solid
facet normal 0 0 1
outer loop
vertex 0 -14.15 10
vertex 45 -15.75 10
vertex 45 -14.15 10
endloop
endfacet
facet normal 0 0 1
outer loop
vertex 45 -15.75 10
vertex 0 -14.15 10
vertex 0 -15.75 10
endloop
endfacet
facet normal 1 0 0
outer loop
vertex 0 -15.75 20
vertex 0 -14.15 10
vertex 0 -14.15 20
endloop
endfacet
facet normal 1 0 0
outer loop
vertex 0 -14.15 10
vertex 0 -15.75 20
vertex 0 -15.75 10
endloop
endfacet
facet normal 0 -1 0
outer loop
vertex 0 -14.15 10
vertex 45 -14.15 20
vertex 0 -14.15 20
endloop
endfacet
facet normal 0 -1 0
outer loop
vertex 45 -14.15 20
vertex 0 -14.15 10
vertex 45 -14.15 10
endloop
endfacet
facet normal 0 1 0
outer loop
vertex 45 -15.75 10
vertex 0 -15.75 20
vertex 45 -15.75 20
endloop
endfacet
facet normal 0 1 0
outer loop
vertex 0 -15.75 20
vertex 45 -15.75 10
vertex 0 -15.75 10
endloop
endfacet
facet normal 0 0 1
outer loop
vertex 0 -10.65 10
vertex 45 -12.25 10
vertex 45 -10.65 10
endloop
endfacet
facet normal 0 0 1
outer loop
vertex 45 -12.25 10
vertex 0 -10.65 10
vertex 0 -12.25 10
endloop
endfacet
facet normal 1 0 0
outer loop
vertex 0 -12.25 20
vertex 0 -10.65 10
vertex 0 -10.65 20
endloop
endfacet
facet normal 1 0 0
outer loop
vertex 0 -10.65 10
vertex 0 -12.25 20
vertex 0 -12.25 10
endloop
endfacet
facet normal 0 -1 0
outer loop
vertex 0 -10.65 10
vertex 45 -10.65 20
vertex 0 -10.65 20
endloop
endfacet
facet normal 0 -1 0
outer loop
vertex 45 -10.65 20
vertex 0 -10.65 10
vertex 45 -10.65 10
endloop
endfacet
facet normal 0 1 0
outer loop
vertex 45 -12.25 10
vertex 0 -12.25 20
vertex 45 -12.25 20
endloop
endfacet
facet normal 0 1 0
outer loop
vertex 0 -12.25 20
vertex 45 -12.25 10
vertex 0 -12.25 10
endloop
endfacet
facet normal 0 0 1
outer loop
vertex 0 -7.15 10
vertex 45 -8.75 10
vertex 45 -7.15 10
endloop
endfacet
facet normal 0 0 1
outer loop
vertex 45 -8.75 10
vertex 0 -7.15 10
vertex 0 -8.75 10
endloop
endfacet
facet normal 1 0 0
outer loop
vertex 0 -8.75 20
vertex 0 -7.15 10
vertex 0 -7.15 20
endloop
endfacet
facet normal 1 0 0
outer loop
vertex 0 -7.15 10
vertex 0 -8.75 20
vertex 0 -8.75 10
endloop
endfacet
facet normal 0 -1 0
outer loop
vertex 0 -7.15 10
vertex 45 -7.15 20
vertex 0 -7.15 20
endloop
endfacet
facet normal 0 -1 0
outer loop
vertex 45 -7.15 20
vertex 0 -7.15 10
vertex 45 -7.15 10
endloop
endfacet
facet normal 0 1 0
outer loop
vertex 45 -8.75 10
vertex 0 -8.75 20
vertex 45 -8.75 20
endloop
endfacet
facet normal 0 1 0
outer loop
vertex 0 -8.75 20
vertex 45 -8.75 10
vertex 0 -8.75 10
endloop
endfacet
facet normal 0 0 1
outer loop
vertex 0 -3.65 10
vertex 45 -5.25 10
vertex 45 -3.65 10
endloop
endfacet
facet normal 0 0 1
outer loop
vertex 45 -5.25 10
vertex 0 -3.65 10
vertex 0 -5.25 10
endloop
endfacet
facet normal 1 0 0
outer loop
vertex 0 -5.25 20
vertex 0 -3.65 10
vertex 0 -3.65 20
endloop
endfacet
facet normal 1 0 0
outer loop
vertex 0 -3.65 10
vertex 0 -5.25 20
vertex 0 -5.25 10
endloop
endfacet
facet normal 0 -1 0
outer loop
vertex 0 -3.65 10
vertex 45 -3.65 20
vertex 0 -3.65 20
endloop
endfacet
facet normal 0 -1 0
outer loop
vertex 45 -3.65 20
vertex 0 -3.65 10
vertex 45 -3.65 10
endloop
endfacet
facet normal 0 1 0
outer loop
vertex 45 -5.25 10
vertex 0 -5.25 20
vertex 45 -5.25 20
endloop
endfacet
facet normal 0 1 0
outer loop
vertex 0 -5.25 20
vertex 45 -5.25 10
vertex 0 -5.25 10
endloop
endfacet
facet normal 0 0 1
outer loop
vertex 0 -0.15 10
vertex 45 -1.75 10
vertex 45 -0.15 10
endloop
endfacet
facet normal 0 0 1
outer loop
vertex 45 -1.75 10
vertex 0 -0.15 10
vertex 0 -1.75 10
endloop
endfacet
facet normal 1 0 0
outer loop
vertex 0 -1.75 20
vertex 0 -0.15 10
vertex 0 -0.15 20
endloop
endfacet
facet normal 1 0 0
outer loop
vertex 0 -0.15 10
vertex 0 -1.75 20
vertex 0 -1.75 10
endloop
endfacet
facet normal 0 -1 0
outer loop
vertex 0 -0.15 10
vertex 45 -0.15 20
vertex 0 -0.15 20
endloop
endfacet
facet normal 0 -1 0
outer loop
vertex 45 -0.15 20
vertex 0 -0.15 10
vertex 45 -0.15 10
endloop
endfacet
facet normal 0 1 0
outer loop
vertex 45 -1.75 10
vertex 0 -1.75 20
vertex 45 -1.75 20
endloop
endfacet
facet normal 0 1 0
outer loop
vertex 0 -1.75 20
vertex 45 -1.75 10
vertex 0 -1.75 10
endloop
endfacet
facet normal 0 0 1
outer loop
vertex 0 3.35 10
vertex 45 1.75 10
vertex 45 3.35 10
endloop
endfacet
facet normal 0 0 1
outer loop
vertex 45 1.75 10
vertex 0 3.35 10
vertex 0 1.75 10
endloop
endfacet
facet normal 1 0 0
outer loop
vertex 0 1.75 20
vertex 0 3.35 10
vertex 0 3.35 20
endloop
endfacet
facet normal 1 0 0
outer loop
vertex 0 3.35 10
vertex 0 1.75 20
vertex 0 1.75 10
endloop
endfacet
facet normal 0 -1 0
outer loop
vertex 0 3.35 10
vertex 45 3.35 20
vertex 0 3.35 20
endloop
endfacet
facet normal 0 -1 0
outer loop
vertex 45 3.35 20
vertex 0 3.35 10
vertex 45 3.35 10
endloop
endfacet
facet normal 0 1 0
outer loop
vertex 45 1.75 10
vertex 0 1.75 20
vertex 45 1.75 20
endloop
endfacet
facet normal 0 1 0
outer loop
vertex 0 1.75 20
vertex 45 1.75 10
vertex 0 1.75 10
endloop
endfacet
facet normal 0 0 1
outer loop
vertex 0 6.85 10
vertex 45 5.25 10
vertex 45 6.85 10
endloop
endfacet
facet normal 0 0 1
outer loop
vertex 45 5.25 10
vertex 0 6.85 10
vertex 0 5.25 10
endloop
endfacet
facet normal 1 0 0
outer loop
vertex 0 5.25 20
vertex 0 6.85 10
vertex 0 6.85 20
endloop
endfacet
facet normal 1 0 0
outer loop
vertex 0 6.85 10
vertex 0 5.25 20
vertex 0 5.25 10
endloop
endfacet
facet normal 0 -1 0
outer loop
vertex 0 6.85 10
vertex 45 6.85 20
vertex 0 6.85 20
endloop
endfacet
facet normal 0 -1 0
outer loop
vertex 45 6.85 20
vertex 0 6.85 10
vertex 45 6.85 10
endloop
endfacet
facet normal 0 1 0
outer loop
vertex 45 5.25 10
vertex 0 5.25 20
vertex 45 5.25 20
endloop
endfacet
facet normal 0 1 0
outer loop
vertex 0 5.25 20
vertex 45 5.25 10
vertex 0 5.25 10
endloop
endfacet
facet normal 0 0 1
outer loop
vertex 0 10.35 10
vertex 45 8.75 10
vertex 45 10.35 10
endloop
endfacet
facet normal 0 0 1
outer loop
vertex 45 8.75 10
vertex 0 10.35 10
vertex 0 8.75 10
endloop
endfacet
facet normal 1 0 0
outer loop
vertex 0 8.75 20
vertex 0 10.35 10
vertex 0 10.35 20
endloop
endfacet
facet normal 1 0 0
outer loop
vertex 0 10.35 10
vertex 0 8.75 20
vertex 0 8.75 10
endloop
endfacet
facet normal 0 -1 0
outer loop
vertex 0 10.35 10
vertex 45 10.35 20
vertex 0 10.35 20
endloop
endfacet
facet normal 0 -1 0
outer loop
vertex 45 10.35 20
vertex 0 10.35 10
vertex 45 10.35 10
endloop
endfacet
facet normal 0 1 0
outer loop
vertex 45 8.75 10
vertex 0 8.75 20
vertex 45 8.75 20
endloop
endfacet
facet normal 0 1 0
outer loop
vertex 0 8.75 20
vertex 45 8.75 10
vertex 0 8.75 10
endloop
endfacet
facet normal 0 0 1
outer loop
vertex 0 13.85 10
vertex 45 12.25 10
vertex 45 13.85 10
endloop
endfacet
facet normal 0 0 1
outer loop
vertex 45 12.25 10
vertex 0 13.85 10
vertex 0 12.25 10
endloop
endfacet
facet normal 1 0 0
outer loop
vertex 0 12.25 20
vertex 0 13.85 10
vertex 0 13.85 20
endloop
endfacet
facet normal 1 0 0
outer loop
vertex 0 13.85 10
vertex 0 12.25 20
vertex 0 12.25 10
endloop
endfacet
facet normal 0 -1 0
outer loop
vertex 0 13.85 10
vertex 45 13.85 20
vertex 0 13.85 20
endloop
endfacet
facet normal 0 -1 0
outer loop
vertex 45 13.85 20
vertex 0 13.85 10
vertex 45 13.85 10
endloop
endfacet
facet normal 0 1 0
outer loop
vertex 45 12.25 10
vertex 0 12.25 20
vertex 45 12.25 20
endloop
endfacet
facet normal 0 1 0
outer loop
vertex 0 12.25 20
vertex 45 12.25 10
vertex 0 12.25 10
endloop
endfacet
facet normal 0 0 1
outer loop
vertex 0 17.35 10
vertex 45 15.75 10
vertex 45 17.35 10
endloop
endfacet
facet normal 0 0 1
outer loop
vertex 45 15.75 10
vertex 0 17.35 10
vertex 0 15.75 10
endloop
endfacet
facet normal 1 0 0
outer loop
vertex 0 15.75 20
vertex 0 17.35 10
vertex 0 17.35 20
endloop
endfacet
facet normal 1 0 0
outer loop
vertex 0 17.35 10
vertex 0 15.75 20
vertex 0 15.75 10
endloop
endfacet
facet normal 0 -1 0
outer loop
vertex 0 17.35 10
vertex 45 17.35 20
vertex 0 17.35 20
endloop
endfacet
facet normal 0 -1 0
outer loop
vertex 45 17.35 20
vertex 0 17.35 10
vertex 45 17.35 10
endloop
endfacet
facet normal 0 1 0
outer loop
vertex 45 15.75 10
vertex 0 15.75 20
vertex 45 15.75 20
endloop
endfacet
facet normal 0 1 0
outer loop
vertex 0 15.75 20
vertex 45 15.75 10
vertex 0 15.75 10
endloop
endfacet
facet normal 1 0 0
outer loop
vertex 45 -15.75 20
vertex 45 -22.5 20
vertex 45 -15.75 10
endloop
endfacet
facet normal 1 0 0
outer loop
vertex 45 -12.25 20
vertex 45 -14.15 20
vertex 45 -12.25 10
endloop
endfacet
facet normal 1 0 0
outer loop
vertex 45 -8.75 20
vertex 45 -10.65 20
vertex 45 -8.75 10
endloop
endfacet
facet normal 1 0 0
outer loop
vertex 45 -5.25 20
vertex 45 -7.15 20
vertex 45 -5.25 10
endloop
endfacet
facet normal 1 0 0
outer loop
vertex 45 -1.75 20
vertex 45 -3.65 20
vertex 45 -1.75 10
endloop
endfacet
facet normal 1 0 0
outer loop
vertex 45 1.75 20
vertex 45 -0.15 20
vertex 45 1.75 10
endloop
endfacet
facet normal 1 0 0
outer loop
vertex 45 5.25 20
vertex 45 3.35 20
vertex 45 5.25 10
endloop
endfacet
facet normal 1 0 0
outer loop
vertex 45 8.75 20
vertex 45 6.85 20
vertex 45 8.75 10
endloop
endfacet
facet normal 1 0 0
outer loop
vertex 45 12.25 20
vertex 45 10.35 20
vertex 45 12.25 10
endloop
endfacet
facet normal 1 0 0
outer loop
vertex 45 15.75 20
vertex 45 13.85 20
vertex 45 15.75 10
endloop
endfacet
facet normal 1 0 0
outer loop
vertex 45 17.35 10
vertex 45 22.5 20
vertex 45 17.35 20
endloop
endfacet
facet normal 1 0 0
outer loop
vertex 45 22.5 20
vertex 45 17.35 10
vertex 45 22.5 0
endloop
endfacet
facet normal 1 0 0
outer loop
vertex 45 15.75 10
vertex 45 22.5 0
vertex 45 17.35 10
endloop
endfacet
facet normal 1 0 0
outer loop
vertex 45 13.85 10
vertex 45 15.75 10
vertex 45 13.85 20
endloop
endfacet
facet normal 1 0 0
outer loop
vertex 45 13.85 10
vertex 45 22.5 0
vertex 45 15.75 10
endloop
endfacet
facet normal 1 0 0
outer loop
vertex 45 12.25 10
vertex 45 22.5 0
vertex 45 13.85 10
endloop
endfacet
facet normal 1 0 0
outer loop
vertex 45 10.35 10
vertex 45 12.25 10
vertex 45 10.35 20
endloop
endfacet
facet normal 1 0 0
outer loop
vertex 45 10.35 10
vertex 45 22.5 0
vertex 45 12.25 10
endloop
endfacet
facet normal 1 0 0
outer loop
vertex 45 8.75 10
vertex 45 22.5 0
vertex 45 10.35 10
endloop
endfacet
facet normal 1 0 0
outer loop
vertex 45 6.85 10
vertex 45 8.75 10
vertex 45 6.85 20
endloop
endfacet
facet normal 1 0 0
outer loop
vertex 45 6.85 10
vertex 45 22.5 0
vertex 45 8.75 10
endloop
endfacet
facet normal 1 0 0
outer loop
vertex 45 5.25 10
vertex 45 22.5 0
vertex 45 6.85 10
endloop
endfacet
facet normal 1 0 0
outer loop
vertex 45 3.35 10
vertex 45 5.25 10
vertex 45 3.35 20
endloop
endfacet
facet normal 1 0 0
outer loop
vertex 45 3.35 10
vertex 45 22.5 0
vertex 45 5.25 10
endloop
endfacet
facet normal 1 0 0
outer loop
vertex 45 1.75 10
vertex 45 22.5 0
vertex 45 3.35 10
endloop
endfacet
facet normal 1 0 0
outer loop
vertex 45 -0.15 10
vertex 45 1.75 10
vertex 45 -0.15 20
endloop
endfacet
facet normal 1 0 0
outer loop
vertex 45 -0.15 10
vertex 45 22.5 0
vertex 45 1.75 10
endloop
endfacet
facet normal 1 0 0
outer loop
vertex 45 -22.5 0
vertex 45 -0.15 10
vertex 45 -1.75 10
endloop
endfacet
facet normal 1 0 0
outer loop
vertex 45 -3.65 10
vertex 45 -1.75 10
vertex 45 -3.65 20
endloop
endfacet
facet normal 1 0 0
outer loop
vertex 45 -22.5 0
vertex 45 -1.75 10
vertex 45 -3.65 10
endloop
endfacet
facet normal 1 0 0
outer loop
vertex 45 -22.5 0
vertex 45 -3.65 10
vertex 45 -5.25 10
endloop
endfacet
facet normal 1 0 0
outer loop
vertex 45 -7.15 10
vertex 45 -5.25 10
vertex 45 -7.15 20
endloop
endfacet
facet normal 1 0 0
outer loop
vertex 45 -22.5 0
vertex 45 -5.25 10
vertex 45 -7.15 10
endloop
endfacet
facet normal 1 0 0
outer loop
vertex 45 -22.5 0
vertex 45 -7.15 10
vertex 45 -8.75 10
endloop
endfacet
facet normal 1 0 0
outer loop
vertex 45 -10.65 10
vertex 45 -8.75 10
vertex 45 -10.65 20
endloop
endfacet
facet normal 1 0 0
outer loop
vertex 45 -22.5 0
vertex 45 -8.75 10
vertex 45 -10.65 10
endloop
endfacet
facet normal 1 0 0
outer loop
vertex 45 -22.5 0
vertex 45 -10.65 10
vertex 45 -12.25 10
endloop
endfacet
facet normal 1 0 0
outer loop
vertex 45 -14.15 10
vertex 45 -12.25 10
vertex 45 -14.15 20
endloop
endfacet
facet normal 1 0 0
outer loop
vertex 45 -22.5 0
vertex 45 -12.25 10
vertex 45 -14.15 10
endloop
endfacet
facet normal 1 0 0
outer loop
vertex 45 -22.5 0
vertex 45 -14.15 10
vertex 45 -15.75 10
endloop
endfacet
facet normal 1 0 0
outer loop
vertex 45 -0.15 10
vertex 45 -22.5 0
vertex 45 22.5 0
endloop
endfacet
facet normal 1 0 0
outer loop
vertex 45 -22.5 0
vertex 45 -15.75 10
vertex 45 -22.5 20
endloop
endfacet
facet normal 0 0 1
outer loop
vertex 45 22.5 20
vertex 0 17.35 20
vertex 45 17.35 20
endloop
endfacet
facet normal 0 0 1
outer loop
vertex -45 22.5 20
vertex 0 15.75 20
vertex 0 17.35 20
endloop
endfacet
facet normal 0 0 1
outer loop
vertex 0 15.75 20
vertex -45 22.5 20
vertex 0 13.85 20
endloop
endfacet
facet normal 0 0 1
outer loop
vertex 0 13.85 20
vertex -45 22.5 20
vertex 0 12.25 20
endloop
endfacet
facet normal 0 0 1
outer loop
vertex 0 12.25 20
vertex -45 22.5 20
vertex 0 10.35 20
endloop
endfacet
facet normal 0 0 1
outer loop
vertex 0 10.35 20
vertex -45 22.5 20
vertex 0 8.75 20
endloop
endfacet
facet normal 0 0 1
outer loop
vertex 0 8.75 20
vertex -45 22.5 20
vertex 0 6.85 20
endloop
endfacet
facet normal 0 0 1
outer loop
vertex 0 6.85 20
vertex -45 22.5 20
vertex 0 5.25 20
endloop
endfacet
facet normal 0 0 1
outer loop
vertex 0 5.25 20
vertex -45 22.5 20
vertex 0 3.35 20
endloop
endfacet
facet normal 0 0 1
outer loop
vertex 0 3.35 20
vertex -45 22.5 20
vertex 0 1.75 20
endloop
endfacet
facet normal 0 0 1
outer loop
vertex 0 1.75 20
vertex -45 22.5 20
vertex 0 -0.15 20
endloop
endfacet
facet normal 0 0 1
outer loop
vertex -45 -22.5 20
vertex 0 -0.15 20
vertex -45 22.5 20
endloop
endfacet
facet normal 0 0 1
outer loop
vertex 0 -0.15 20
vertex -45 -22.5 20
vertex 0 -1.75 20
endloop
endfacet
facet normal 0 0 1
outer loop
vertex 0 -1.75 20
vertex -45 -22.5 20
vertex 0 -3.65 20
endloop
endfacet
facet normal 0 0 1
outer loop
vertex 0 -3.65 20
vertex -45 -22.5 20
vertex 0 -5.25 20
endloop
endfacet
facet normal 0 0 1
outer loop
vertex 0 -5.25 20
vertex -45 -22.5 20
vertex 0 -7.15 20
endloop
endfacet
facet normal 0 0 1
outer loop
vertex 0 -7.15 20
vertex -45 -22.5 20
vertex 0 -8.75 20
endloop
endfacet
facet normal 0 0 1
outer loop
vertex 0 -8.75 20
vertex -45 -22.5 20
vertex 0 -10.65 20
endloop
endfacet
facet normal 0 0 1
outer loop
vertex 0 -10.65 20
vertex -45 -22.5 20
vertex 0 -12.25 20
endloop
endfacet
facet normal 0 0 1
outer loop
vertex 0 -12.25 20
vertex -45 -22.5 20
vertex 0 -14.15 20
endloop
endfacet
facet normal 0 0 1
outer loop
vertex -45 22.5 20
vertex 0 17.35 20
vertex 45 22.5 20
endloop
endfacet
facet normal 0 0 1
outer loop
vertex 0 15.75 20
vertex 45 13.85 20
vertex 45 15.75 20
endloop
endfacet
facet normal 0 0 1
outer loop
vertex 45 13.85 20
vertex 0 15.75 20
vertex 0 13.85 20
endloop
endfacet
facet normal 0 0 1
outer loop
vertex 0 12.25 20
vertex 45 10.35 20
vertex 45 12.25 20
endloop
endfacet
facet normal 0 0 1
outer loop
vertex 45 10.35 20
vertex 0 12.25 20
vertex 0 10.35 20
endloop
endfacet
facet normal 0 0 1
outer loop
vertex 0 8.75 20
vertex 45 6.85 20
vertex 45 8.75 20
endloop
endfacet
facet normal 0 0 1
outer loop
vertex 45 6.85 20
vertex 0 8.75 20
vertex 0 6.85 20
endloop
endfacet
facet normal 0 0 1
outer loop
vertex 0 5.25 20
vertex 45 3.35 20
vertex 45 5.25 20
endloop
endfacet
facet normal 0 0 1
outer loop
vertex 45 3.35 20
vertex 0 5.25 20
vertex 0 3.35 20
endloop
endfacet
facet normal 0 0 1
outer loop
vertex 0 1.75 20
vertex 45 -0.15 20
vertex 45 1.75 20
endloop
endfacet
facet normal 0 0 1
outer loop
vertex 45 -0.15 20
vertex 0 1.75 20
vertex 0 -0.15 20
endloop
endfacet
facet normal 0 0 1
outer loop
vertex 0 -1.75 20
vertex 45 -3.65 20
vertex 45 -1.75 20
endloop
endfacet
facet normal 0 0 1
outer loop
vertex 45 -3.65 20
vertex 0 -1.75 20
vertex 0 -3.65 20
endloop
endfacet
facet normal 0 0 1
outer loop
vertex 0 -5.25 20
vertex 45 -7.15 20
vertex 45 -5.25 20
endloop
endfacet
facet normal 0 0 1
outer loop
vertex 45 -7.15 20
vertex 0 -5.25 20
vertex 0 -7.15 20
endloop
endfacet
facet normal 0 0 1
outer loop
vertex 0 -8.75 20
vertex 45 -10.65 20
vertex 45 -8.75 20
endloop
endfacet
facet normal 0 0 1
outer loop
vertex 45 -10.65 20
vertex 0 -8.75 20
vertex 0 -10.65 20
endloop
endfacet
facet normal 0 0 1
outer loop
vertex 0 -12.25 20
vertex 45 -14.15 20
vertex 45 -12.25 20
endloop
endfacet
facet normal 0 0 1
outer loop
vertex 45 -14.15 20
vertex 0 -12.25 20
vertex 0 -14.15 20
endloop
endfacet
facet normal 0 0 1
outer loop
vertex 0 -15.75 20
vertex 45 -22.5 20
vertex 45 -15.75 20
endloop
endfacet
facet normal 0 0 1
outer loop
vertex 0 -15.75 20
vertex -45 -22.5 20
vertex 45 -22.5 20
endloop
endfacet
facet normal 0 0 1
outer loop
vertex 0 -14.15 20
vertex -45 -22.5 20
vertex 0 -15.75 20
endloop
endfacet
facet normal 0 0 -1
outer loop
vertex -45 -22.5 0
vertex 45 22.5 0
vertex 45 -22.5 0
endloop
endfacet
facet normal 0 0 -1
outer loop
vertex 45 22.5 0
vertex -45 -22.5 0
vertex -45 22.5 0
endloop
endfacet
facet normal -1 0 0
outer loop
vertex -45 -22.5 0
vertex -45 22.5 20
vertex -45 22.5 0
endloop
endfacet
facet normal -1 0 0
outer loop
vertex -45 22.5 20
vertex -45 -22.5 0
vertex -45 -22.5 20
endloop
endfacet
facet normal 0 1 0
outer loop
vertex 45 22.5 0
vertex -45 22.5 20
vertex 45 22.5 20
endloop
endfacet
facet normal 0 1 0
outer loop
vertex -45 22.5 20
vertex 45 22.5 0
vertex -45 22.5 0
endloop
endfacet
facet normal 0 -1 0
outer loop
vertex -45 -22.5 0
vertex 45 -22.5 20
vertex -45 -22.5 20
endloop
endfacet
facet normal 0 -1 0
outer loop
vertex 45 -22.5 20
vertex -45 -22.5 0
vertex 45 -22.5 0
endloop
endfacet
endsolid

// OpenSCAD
// Slide drying rack for 10 microscope slides (75 x 25 x 1 mm)
// Print orientation: base on XY plane, slots open upward (+Z)

// ---------- Block ----------
block_len   = 90;    // block length along X (mm)
block_wid   = 45;    // block width along Y (mm)
block_ht    = 20;    // block height along Z (mm)

// ---------- Slots ----------
slot_count  = 10;    // number of slide slots
slot_len    = 77;    // slot length along X (mm)
slot_wid    = 1.6;   // slot width along Y (mm)
slot_depth  = 10;    // slot depth from top face (mm)
slot_pitch  = 3.5;   // centre-to-centre spacing in Y (mm)

// ---------- Misc ----------
eps         = 0.5;   // overshoot for clean cuts (mm)
$fn         = 64;    // curve resolution

// Derived
first_y = -(slot_count - 1) * slot_pitch / 2;  // Y of first slot centre

difference() {
    // Base block, centred in X/Y, sitting on z = 0
    translate([-block_len / 2, -block_wid / 2, 0])
        cube([block_len, block_wid, block_ht]);

    // Slots, open at the top
    for (i = [0 : slot_count - 1]) {
        translate([0, first_y + i * slot_pitch, block_ht - slot_depth])
            cube([slot_len, slot_wid, slot_depth + eps]);
    }
}
